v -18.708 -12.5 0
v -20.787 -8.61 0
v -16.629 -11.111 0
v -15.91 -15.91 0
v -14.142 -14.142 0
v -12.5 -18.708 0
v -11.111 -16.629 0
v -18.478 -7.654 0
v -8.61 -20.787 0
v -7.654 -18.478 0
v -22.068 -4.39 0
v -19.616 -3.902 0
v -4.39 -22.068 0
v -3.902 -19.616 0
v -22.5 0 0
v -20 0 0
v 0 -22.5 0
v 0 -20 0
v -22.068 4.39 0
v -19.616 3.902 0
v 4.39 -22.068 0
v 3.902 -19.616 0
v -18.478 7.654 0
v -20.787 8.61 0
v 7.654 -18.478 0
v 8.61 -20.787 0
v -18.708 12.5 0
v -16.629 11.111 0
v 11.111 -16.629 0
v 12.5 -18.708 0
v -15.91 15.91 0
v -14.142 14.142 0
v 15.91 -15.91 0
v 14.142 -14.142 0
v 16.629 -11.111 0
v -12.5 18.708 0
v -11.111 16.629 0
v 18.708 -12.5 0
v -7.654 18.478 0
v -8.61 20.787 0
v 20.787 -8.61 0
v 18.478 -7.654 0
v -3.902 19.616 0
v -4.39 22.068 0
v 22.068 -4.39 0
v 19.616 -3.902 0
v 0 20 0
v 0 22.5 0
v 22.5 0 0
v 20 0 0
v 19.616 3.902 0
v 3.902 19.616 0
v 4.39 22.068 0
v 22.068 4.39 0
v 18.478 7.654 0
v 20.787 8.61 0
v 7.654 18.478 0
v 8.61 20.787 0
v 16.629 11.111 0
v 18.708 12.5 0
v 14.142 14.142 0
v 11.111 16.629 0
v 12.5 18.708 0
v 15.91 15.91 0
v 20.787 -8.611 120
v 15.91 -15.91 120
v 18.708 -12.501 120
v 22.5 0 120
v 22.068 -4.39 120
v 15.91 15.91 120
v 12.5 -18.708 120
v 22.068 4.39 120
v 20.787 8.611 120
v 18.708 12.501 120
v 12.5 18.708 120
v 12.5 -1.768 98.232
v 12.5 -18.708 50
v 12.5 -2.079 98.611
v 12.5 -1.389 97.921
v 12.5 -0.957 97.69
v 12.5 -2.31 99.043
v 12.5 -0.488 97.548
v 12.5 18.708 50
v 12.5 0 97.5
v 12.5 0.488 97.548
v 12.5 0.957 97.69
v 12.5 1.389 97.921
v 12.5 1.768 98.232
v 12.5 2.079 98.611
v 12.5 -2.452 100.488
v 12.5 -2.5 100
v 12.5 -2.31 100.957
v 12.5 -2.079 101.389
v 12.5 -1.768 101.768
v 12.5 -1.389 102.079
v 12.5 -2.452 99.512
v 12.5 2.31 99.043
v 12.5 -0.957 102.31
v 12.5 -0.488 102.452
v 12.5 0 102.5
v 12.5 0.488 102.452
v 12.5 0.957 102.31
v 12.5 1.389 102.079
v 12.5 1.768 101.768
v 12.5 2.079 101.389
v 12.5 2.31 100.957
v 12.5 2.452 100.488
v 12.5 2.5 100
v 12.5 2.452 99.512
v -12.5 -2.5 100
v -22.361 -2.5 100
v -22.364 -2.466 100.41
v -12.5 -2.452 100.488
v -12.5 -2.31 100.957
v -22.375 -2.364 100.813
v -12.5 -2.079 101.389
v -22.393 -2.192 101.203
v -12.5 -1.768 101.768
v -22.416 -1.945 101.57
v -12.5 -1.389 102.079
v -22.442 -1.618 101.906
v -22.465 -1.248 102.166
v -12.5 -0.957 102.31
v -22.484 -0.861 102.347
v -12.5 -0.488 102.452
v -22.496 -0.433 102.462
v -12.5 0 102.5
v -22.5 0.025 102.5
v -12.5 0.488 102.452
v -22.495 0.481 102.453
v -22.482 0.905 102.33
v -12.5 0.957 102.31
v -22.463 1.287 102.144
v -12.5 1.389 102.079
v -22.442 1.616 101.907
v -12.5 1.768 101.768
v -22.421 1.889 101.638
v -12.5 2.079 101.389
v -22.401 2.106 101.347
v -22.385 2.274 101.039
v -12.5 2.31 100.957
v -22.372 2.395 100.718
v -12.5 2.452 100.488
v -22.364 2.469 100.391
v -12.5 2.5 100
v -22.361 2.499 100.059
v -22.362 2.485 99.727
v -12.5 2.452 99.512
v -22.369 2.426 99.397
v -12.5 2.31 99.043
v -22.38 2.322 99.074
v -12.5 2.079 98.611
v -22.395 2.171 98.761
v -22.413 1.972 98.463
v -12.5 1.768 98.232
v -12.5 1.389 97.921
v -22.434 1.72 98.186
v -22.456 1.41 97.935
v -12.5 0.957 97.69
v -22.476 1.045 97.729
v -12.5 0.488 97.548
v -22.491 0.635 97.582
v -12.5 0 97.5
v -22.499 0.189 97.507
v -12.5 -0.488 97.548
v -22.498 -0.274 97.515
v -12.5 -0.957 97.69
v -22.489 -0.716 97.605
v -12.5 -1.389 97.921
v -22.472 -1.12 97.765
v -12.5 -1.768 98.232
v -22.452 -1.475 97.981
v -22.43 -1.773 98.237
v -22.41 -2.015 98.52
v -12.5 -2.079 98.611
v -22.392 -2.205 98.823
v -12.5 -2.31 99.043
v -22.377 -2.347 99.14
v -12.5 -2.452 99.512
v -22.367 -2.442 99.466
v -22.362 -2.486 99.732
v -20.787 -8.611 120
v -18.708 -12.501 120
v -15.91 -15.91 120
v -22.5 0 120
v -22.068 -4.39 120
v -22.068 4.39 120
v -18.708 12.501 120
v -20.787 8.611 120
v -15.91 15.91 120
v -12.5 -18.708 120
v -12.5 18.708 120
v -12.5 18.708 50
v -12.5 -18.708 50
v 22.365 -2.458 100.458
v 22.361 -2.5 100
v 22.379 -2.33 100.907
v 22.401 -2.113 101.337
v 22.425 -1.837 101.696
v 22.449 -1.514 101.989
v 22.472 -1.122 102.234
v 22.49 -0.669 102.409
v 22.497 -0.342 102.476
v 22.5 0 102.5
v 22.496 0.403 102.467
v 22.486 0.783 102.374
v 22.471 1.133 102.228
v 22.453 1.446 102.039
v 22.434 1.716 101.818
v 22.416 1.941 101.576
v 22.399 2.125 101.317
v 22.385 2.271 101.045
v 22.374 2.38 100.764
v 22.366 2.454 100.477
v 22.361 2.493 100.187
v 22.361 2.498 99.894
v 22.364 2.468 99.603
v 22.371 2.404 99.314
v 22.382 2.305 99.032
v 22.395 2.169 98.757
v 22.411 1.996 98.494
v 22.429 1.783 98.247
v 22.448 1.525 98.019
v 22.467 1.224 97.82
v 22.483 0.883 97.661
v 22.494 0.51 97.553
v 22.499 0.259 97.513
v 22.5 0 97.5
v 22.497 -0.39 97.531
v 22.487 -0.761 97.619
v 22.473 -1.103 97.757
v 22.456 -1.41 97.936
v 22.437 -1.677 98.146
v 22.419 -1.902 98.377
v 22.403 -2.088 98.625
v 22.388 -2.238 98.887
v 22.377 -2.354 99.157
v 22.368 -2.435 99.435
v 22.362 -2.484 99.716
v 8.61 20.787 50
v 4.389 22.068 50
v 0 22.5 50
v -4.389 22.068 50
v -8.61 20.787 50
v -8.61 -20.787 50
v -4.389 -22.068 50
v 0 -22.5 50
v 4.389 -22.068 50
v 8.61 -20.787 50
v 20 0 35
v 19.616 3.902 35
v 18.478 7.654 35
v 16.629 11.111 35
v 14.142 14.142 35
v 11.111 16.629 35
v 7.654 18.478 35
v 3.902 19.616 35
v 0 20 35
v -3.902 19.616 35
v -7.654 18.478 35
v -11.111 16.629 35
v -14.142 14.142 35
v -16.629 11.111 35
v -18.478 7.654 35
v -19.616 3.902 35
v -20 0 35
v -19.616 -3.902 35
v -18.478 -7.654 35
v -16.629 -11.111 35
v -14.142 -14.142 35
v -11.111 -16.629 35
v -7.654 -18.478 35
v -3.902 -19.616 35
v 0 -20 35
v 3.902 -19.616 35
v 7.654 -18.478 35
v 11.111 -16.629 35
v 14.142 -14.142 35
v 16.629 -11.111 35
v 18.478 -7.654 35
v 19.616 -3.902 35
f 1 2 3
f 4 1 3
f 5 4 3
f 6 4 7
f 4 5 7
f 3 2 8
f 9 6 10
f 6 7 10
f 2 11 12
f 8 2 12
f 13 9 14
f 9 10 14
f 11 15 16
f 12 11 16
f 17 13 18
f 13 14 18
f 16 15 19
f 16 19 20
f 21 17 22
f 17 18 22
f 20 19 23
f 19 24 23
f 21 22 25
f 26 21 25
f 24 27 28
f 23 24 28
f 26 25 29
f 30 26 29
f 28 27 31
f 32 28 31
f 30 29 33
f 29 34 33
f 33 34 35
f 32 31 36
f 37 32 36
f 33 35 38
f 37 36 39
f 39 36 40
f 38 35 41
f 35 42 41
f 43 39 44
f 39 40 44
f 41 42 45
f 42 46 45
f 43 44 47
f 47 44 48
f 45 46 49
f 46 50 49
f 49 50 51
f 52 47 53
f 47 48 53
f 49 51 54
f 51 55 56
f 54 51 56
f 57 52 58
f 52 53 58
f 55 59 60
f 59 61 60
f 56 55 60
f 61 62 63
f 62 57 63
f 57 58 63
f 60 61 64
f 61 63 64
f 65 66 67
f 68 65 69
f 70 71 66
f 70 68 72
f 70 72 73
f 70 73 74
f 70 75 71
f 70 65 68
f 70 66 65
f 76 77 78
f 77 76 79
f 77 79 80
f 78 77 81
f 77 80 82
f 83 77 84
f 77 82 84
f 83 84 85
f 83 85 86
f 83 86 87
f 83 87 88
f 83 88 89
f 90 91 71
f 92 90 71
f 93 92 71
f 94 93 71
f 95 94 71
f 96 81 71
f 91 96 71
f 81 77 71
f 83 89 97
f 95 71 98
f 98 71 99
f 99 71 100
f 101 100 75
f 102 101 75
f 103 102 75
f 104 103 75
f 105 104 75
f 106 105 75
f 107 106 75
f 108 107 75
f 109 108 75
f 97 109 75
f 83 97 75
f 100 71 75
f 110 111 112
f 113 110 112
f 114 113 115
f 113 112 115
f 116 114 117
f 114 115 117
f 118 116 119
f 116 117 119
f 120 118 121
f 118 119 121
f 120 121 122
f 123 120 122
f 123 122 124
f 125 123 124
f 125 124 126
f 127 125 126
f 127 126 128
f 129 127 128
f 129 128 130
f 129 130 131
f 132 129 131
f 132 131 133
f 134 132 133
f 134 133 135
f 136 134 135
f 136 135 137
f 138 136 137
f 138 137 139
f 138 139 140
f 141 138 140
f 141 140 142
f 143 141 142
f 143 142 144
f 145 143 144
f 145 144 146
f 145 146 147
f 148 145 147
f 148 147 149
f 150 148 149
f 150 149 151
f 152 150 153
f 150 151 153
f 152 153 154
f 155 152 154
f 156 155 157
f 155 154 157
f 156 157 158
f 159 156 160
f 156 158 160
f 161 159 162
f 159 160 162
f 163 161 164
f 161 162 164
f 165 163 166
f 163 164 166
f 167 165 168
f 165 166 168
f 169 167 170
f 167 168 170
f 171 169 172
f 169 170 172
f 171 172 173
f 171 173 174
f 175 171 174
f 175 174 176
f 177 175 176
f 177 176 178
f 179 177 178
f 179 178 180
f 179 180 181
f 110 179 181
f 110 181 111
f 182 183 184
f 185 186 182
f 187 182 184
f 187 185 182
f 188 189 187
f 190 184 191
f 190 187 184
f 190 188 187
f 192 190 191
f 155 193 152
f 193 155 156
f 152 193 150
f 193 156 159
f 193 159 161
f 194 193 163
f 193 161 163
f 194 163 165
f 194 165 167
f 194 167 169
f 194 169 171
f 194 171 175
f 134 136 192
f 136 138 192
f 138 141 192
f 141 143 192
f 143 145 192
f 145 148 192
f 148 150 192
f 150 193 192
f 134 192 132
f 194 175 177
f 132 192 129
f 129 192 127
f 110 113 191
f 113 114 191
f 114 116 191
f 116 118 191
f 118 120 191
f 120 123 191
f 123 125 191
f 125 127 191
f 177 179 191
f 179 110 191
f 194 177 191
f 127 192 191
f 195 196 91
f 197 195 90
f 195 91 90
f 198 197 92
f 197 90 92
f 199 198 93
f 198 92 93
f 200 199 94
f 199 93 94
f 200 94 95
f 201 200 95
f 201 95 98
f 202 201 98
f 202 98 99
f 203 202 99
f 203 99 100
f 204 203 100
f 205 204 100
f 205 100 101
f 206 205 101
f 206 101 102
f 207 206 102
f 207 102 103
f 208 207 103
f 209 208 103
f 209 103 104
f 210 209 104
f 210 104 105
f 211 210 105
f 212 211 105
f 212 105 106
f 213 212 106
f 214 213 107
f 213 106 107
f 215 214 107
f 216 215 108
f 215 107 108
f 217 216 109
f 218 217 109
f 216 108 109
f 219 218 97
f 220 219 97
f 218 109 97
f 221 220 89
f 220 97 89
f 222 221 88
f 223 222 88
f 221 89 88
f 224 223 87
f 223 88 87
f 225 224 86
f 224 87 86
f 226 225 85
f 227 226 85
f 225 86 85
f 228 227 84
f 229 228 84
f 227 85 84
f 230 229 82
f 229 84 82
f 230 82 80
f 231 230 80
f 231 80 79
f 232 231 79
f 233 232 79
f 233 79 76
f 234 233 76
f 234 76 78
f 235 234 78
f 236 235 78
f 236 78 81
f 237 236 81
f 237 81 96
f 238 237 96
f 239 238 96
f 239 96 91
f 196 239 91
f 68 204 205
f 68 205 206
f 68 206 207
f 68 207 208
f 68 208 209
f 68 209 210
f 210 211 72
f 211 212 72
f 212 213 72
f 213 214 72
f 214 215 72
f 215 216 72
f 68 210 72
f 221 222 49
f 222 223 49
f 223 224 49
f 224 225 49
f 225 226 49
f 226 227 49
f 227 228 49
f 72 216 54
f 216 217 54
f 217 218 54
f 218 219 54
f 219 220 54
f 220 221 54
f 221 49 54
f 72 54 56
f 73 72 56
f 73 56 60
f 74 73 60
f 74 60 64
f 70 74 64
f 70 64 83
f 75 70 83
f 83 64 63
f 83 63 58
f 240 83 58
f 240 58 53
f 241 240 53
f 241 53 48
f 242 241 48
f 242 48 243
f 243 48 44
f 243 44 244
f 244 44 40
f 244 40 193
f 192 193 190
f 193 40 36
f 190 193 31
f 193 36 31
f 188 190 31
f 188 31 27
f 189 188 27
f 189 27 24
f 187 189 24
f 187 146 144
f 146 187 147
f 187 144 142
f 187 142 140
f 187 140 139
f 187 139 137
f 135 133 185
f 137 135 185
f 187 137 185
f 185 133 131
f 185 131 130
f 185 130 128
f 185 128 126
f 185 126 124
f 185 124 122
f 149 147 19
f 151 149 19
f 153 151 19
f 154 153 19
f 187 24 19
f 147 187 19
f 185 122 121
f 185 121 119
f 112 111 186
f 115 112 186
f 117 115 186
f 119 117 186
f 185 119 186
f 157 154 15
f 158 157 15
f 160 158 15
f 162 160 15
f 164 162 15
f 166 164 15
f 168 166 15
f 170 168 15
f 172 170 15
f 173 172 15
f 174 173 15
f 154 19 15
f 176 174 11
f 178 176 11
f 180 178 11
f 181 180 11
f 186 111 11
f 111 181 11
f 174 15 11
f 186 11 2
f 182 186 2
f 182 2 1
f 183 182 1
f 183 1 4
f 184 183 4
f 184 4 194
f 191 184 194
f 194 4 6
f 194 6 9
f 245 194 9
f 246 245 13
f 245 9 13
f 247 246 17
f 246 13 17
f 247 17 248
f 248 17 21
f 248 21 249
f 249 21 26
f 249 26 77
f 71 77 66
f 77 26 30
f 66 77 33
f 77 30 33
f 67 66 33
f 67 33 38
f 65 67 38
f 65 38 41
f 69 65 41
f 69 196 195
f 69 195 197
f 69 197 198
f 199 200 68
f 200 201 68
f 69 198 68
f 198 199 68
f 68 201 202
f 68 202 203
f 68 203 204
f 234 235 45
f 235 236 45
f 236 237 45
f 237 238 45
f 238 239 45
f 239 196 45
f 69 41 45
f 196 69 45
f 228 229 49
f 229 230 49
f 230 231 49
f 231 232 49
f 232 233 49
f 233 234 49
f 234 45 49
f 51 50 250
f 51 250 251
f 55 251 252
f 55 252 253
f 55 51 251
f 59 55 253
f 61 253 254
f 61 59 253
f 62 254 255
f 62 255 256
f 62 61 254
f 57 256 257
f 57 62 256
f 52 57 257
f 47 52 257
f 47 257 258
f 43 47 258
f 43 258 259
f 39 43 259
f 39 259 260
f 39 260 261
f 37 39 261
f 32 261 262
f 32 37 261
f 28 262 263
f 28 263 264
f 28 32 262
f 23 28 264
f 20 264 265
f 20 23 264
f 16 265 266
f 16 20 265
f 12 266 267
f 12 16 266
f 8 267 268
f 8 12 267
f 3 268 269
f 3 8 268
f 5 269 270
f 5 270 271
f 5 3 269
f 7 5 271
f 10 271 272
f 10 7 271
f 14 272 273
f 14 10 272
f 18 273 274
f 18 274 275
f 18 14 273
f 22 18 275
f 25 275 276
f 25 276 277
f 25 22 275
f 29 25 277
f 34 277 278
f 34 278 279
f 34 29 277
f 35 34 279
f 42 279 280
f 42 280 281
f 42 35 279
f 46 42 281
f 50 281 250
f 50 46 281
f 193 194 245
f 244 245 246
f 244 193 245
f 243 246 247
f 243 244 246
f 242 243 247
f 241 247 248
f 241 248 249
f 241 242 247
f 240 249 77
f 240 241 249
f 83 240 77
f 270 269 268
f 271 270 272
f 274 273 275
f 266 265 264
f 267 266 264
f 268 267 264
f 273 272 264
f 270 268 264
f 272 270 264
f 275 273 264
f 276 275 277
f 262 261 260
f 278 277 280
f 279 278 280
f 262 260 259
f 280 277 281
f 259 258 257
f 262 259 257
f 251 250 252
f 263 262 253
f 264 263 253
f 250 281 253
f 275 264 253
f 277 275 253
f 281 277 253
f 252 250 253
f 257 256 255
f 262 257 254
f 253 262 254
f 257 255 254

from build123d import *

# Parameters (mm, degrees)
F0_R     = 22.5
F1_DEPTH = 120
F3_DEPTH = 70
F4_R     = 20
F5_DEPTH = 35
F8_D     = 5


with BuildPart() as f1:
    # F0 (on Top) → F1 (new body)
    with BuildSketch(Plane.XY):
        Circle(F0_R)
    extrude(amount=F1_DEPTH)

    # F2 (on face) → F3 (cut)
    with BuildSketch(Plane.XY.offset(120)):
        with BuildLine():
            ThreePointArc((12.5, 18.708287), (0, 22.5), (-12.5, 18.708287))
            Line((-12.5, 18.708287), (-12.5, -18.708287))
            ThreePointArc((-12.5, -18.708287), (0, -22.5), (12.5, -18.708287))
            Line((12.5, -18.708287), (12.5, 18.708287))
        make_face()
    extrude(amount=-F3_DEPTH, mode=Mode.SUBTRACT)

    # F4 (on face) → F5 (cut)
    with BuildSketch(Plane.XY):
        Circle(F4_R)
    extrude(amount=F5_DEPTH, mode=Mode.SUBTRACT)

    # F8 (through all)
    with Locations(Plane.YZ.offset(22.5)):
        with Locations((0, 100)):
            Hole(F8_D / 2)


solid = f1.part
